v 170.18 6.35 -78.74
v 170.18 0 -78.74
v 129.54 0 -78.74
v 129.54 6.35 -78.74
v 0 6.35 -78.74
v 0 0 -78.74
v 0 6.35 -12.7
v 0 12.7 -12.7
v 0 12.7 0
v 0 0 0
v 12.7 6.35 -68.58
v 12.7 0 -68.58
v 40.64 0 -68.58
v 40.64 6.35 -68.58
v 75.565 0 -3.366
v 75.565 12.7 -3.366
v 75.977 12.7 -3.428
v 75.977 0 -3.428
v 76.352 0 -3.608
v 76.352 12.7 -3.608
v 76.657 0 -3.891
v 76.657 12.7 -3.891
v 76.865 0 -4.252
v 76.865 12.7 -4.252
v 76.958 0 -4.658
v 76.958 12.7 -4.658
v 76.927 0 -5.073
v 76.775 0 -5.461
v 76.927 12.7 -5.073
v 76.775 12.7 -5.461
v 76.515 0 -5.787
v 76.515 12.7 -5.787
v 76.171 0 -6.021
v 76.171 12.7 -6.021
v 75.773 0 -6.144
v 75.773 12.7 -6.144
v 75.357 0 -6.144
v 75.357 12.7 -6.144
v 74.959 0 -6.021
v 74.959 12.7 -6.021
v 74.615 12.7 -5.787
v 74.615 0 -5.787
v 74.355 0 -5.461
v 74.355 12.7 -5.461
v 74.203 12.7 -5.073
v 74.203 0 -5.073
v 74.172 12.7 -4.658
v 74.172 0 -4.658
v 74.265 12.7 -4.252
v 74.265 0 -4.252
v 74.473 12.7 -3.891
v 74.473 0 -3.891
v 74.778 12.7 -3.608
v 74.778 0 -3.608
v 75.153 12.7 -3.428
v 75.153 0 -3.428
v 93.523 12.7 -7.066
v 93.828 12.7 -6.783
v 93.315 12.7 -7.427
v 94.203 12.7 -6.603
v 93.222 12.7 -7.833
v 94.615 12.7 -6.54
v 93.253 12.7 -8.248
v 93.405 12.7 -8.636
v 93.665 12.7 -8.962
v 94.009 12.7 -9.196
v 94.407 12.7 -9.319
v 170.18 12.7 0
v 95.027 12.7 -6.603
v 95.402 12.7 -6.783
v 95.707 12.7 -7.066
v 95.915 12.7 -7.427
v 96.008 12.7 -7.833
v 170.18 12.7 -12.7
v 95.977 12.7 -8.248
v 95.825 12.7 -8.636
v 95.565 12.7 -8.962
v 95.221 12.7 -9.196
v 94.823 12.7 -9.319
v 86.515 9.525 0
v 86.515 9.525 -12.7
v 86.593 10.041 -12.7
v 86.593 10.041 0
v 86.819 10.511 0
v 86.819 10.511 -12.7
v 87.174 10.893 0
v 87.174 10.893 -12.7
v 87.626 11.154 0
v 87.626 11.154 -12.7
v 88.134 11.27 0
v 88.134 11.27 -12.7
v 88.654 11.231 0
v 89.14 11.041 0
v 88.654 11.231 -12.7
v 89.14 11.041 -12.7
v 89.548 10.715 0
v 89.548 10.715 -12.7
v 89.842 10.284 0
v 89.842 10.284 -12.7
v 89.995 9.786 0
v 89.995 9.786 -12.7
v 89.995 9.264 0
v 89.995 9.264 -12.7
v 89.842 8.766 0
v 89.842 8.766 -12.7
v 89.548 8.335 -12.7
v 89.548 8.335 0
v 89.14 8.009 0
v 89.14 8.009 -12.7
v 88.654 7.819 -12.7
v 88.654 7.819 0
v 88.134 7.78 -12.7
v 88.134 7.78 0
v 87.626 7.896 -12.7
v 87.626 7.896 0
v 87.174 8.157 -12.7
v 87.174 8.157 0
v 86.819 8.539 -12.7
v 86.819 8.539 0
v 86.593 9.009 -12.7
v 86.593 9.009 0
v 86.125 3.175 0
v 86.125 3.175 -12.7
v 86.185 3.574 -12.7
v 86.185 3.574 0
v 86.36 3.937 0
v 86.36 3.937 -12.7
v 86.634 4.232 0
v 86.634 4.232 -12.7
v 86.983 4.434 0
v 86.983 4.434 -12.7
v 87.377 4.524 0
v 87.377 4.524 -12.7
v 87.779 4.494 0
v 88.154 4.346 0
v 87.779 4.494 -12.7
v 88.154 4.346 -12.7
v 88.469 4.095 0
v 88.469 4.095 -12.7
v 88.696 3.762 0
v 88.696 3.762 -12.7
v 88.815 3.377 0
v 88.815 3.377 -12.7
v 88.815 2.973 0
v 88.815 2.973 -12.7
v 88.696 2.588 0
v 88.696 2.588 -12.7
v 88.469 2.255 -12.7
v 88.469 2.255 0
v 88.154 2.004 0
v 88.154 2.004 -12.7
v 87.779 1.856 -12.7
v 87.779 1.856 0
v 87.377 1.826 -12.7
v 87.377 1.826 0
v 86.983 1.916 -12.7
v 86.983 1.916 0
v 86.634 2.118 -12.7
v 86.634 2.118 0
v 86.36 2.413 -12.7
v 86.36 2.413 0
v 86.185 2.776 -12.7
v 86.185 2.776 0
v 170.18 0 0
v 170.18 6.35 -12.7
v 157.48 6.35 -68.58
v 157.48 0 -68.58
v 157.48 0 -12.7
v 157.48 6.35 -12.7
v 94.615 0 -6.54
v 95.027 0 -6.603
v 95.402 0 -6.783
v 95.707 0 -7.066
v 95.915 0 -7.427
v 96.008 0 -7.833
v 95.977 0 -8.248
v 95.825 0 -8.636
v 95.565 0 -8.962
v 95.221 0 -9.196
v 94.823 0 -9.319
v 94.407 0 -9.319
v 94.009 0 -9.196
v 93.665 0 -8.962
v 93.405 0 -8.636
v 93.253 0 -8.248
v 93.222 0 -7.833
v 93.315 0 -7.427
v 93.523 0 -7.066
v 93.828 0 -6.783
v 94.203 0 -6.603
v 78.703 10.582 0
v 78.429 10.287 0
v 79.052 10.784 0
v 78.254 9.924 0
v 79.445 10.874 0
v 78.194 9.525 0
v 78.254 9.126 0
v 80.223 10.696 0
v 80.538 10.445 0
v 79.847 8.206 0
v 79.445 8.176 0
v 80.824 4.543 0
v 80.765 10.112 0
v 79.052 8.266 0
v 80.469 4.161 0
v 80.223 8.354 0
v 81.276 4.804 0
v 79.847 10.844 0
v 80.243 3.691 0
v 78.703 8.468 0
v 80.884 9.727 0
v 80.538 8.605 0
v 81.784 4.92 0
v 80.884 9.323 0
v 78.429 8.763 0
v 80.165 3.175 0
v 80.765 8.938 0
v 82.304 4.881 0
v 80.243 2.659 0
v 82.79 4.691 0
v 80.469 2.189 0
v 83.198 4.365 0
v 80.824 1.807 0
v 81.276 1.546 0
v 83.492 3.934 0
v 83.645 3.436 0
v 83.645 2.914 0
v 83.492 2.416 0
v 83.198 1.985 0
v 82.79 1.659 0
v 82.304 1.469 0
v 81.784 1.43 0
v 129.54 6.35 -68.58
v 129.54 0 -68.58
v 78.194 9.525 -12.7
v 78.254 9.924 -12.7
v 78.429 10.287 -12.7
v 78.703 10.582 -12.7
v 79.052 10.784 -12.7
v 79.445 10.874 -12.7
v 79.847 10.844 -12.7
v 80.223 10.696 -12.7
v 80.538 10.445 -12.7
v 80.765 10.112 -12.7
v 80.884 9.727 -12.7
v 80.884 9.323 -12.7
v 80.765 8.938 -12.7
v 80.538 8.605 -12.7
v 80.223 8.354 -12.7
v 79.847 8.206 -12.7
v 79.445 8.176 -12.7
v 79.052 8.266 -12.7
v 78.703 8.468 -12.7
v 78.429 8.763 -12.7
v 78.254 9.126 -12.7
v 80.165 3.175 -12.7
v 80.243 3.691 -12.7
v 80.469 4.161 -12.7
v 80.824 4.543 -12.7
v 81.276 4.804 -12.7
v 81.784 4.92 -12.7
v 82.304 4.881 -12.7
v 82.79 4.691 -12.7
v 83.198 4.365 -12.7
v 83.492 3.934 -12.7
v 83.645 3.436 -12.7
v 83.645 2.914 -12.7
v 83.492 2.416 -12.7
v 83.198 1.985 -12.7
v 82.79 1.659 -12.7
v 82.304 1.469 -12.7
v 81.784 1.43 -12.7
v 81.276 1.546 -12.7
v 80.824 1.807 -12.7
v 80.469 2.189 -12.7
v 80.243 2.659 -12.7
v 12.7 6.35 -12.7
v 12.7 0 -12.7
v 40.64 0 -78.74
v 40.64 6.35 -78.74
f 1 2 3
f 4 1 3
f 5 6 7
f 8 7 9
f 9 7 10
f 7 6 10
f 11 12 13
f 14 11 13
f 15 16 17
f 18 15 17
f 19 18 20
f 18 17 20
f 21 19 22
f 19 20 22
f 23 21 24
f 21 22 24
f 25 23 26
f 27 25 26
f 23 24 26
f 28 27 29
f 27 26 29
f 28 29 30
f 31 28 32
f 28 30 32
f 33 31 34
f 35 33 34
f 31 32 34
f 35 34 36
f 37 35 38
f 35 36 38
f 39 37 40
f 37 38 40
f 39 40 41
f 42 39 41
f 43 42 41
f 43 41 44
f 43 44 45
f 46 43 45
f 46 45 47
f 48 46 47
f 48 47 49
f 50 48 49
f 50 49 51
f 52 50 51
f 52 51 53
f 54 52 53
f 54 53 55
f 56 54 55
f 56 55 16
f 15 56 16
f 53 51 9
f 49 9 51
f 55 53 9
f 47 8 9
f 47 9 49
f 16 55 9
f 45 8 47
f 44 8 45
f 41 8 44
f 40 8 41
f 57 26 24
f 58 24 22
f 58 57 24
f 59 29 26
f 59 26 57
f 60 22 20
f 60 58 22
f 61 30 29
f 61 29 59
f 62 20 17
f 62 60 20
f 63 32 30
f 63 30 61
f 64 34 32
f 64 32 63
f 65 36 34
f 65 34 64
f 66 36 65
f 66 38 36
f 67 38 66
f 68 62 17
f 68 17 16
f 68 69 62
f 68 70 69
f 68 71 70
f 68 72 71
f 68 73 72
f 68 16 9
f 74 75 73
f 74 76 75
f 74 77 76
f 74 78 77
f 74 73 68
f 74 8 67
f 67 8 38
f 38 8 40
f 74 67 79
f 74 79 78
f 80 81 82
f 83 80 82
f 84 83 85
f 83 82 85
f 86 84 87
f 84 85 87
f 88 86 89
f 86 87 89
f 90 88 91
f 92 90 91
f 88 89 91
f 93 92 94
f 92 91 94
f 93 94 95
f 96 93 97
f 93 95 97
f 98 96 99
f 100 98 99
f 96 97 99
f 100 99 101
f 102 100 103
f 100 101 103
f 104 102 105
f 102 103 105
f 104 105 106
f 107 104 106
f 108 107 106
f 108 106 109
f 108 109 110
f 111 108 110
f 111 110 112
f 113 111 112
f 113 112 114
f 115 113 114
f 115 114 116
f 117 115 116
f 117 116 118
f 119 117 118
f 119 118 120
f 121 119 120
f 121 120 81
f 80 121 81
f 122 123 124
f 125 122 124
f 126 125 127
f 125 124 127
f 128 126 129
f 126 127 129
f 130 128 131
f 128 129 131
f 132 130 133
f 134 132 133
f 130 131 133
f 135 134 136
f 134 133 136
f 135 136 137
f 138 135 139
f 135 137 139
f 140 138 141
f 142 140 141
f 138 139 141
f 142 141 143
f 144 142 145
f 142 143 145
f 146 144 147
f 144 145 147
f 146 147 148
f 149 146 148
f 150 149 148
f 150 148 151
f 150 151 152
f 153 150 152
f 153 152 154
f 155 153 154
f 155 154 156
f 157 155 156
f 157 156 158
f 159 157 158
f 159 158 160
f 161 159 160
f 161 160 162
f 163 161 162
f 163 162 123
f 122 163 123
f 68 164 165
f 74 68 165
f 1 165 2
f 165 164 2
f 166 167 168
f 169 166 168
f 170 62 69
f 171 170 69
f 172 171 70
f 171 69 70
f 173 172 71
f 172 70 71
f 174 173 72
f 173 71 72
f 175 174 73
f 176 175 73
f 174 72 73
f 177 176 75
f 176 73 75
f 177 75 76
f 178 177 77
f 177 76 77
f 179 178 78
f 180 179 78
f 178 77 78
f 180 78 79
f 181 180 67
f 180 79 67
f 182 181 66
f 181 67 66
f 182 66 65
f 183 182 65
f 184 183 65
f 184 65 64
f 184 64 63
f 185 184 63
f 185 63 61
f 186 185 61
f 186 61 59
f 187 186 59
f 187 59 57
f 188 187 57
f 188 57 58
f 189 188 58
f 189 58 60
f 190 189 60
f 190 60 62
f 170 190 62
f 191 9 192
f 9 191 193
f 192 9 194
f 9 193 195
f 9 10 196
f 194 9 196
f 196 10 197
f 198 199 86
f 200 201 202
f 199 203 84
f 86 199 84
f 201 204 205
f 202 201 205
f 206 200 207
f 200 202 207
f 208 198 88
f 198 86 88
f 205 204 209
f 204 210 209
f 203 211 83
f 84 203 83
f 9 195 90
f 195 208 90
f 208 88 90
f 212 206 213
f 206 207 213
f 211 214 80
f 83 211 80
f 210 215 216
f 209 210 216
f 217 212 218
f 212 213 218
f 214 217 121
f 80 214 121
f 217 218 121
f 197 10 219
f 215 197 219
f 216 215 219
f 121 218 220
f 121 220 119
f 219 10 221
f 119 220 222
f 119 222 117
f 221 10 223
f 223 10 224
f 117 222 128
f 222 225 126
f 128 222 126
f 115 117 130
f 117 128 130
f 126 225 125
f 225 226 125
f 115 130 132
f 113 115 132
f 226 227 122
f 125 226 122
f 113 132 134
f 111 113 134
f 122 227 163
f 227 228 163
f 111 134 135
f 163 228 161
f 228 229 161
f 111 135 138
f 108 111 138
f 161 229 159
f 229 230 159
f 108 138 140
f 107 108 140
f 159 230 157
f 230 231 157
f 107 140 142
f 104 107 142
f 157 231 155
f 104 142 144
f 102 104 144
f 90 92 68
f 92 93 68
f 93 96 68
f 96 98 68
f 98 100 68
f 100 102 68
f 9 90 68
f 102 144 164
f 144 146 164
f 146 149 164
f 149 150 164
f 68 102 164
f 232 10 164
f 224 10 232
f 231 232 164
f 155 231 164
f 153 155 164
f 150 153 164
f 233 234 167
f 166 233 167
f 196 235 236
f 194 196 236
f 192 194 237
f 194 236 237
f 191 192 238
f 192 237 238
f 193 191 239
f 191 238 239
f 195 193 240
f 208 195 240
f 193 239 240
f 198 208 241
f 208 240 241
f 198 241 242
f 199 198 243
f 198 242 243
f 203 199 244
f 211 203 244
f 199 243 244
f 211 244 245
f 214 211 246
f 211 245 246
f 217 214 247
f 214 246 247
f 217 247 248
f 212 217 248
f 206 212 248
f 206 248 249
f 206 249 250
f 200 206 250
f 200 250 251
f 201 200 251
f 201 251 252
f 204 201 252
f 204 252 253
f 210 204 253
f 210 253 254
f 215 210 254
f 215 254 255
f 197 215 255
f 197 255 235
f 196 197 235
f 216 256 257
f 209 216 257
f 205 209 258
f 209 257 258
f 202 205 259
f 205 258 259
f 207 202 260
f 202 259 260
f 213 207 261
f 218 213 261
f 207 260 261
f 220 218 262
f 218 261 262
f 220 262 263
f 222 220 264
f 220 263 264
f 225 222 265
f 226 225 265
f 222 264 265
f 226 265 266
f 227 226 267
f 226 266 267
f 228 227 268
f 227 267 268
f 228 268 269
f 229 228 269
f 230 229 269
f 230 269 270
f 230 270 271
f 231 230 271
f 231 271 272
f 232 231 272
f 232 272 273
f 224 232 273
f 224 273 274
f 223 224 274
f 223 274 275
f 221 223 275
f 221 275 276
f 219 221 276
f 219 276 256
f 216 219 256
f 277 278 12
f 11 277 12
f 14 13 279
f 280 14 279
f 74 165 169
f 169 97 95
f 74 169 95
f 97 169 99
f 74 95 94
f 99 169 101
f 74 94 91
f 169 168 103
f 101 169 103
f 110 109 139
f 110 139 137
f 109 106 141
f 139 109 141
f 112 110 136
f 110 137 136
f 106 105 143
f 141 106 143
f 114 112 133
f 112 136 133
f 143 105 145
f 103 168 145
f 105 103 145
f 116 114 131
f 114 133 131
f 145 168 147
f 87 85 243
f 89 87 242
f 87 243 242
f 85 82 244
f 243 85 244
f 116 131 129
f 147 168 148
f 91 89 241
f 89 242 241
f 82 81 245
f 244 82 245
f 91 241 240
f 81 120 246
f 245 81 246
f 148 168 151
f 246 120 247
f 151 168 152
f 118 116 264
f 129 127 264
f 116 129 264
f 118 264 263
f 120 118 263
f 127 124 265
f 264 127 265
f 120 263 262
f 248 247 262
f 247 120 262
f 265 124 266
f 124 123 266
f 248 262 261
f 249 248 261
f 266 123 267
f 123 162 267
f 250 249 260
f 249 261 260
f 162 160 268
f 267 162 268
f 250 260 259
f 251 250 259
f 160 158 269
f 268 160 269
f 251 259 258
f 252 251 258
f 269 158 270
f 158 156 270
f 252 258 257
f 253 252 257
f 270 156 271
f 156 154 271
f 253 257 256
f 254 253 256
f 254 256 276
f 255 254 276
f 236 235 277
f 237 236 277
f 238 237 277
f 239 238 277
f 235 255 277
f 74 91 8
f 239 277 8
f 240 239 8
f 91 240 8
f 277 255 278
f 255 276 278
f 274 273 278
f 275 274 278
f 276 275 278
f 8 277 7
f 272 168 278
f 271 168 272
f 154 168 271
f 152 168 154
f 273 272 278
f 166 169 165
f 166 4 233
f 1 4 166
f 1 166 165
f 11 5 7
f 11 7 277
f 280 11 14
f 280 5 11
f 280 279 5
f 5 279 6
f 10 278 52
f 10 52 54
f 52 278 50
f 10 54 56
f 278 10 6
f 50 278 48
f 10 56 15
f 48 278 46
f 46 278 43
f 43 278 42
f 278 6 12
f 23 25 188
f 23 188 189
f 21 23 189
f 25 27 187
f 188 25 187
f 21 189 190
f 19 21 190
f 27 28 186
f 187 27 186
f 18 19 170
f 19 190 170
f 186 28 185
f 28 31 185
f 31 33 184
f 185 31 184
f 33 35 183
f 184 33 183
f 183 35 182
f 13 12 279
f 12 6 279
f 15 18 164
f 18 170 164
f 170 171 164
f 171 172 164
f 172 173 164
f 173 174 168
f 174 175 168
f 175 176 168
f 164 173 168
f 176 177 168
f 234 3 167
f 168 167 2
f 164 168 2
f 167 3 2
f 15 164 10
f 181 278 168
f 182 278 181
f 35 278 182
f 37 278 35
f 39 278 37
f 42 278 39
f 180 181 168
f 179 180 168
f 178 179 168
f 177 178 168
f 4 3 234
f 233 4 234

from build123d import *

# Parameters (mm, degrees)
BOSS_EXTRUDE2_DEPTH   = 6.35
BOSS_EXTRUDE2_2_DEPTH = 6.35
BOSS_EXTRUDE3_DEPTH   = 12.7
CUT_EXTRUDE2_REACH    = 189.943
SKETCH3_R             = 1.397
CUT_EXTRUDE3_REACH    = 184.986
SKETCH4_R             = 1.35255
SKETCH5_R             = 1.75
CUT_EXTRUDE5_DEPTH    = 24


with BuildPart() as part:
    # Sketch1 → Boss-Extrude2 (new body)
    with BuildSketch(Plane(origin=(0, 0, 0), x_dir=(1, 0, 0), z_dir=(0, 1, 0))):
        Polygon((12.7, 68.58), (40.64, 68.58), (40.64, 78.74), (0, 78.74), (0, 12.7), (12.7, 12.7), align=None)
    extrude(amount=BOSS_EXTRUDE2_DEPTH)



with BuildPart() as body_2:
    # Sketch1 → Boss-Extrude2 2 (new body)
    with BuildSketch(Plane(origin=(0, 0, 0), x_dir=(1, 0, 0), z_dir=(0, 1, 0))):
        Polygon((157.48, 68.58), (157.48, 12.7), (170.18, 12.7), (170.18, 78.74), (129.54, 78.74), (129.54, 68.58), align=None)
    extrude(amount=BOSS_EXTRUDE2_2_DEPTH)


with BuildPart() as part_1:
    add(part.part)

    add(body_2.part)  # Boss-Extrude3 merges body 2
    # Sketch1<3> → Boss-Extrude3 (add)
    with BuildSketch(Plane(origin=(0, 0, 0), x_dir=(1, 0, 0), z_dir=(0, 1, 0))):
        Polygon((157.48, 12.7), (12.7, 12.7), (0, 12.7), (0, 0), (170.18, 0), (170.18, 12.7), align=None)
    extrude(amount=BOSS_EXTRUDE3_DEPTH)

    # Sketch3 → Cut-Extrude2 (cut, up to next)
    with BuildSketch(Plane(origin=(0, 12.7, 0), x_dir=(1, 0, 0), z_dir=(0, 1, 0)), mode=Mode.PRIVATE) as cut_extrude2_sk1:
        with Locations((75.565, 4.7625)):
            Circle(SKETCH3_R)
    cut_extrude2_tool1 = extrude(cut_extrude2_sk1.sketch, amount=-CUT_EXTRUDE2_REACH, mode=Mode.PRIVATE) & part_1.part
    # Sketch3 → Cut-Extrude2 (cut, up to next)
    with BuildSketch(Plane(origin=(0, 12.7, 0), x_dir=(1, 0, 0), z_dir=(0, 1, 0)), mode=Mode.PRIVATE) as cut_extrude2_sk2:
        with Locations((94.615, 7.9375)):
            Circle(SKETCH3_R)
    cut_extrude2_tool2 = extrude(cut_extrude2_sk2.sketch, amount=-CUT_EXTRUDE2_REACH, mode=Mode.PRIVATE) & part_1.part
    add(cut_extrude2_tool1.solids().sort_by_distance((75.565, 12.7, -4.7625))[0], mode=Mode.SUBTRACT)
    add(cut_extrude2_tool2.solids().sort_by_distance((94.615, 12.7, -7.9375))[0], mode=Mode.SUBTRACT)

    # Sketch4 → Cut-Extrude3 (cut, up to next)
    with BuildSketch(Plane(origin=(0, 0, -12.7), x_dir=(-1, 0, 0), z_dir=(0, 0, -1)), mode=Mode.PRIVATE) as cut_extrude3_sk1:
        with Locations((-87.4776, 3.175)):
            Circle(SKETCH4_R)
    cut_extrude3_tool1 = extrude(cut_extrude3_sk1.sketch, amount=-CUT_EXTRUDE3_REACH, mode=Mode.PRIVATE) & part_1.part
    # Sketch4 → Cut-Extrude3 (cut, up to next)
    with BuildSketch(Plane(origin=(0, 0, -12.7), x_dir=(-1, 0, 0), z_dir=(0, 0, -1)), mode=Mode.PRIVATE) as cut_extrude3_sk2:
        with Locations((-79.546452542, 9.525)):
            Circle(SKETCH4_R)
    cut_extrude3_tool2 = extrude(cut_extrude3_sk2.sketch, amount=-CUT_EXTRUDE3_REACH, mode=Mode.PRIVATE) & part_1.part
    add(cut_extrude3_tool1.solids().sort_by_distance((87.4776, 3.175, -12.7))[0], mode=Mode.SUBTRACT)
    add(cut_extrude3_tool2.solids().sort_by_distance((79.546453, 9.525, -12.7))[0], mode=Mode.SUBTRACT)

    # Sketch5 → Cut-Extrude5 (cut)
    with BuildSketch(Plane(origin=(0, 0, -12.7), x_dir=(-1, 0, 0), z_dir=(0, 0, -1))):
        with Locations((-88.265, 9.525)):
            Circle(SKETCH5_R)
        with Locations((-81.915, 3.175)):
            Circle(SKETCH5_R)
    extrude(amount=-CUT_EXTRUDE5_DEPTH, mode=Mode.SUBTRACT)


solid = part_1.part
